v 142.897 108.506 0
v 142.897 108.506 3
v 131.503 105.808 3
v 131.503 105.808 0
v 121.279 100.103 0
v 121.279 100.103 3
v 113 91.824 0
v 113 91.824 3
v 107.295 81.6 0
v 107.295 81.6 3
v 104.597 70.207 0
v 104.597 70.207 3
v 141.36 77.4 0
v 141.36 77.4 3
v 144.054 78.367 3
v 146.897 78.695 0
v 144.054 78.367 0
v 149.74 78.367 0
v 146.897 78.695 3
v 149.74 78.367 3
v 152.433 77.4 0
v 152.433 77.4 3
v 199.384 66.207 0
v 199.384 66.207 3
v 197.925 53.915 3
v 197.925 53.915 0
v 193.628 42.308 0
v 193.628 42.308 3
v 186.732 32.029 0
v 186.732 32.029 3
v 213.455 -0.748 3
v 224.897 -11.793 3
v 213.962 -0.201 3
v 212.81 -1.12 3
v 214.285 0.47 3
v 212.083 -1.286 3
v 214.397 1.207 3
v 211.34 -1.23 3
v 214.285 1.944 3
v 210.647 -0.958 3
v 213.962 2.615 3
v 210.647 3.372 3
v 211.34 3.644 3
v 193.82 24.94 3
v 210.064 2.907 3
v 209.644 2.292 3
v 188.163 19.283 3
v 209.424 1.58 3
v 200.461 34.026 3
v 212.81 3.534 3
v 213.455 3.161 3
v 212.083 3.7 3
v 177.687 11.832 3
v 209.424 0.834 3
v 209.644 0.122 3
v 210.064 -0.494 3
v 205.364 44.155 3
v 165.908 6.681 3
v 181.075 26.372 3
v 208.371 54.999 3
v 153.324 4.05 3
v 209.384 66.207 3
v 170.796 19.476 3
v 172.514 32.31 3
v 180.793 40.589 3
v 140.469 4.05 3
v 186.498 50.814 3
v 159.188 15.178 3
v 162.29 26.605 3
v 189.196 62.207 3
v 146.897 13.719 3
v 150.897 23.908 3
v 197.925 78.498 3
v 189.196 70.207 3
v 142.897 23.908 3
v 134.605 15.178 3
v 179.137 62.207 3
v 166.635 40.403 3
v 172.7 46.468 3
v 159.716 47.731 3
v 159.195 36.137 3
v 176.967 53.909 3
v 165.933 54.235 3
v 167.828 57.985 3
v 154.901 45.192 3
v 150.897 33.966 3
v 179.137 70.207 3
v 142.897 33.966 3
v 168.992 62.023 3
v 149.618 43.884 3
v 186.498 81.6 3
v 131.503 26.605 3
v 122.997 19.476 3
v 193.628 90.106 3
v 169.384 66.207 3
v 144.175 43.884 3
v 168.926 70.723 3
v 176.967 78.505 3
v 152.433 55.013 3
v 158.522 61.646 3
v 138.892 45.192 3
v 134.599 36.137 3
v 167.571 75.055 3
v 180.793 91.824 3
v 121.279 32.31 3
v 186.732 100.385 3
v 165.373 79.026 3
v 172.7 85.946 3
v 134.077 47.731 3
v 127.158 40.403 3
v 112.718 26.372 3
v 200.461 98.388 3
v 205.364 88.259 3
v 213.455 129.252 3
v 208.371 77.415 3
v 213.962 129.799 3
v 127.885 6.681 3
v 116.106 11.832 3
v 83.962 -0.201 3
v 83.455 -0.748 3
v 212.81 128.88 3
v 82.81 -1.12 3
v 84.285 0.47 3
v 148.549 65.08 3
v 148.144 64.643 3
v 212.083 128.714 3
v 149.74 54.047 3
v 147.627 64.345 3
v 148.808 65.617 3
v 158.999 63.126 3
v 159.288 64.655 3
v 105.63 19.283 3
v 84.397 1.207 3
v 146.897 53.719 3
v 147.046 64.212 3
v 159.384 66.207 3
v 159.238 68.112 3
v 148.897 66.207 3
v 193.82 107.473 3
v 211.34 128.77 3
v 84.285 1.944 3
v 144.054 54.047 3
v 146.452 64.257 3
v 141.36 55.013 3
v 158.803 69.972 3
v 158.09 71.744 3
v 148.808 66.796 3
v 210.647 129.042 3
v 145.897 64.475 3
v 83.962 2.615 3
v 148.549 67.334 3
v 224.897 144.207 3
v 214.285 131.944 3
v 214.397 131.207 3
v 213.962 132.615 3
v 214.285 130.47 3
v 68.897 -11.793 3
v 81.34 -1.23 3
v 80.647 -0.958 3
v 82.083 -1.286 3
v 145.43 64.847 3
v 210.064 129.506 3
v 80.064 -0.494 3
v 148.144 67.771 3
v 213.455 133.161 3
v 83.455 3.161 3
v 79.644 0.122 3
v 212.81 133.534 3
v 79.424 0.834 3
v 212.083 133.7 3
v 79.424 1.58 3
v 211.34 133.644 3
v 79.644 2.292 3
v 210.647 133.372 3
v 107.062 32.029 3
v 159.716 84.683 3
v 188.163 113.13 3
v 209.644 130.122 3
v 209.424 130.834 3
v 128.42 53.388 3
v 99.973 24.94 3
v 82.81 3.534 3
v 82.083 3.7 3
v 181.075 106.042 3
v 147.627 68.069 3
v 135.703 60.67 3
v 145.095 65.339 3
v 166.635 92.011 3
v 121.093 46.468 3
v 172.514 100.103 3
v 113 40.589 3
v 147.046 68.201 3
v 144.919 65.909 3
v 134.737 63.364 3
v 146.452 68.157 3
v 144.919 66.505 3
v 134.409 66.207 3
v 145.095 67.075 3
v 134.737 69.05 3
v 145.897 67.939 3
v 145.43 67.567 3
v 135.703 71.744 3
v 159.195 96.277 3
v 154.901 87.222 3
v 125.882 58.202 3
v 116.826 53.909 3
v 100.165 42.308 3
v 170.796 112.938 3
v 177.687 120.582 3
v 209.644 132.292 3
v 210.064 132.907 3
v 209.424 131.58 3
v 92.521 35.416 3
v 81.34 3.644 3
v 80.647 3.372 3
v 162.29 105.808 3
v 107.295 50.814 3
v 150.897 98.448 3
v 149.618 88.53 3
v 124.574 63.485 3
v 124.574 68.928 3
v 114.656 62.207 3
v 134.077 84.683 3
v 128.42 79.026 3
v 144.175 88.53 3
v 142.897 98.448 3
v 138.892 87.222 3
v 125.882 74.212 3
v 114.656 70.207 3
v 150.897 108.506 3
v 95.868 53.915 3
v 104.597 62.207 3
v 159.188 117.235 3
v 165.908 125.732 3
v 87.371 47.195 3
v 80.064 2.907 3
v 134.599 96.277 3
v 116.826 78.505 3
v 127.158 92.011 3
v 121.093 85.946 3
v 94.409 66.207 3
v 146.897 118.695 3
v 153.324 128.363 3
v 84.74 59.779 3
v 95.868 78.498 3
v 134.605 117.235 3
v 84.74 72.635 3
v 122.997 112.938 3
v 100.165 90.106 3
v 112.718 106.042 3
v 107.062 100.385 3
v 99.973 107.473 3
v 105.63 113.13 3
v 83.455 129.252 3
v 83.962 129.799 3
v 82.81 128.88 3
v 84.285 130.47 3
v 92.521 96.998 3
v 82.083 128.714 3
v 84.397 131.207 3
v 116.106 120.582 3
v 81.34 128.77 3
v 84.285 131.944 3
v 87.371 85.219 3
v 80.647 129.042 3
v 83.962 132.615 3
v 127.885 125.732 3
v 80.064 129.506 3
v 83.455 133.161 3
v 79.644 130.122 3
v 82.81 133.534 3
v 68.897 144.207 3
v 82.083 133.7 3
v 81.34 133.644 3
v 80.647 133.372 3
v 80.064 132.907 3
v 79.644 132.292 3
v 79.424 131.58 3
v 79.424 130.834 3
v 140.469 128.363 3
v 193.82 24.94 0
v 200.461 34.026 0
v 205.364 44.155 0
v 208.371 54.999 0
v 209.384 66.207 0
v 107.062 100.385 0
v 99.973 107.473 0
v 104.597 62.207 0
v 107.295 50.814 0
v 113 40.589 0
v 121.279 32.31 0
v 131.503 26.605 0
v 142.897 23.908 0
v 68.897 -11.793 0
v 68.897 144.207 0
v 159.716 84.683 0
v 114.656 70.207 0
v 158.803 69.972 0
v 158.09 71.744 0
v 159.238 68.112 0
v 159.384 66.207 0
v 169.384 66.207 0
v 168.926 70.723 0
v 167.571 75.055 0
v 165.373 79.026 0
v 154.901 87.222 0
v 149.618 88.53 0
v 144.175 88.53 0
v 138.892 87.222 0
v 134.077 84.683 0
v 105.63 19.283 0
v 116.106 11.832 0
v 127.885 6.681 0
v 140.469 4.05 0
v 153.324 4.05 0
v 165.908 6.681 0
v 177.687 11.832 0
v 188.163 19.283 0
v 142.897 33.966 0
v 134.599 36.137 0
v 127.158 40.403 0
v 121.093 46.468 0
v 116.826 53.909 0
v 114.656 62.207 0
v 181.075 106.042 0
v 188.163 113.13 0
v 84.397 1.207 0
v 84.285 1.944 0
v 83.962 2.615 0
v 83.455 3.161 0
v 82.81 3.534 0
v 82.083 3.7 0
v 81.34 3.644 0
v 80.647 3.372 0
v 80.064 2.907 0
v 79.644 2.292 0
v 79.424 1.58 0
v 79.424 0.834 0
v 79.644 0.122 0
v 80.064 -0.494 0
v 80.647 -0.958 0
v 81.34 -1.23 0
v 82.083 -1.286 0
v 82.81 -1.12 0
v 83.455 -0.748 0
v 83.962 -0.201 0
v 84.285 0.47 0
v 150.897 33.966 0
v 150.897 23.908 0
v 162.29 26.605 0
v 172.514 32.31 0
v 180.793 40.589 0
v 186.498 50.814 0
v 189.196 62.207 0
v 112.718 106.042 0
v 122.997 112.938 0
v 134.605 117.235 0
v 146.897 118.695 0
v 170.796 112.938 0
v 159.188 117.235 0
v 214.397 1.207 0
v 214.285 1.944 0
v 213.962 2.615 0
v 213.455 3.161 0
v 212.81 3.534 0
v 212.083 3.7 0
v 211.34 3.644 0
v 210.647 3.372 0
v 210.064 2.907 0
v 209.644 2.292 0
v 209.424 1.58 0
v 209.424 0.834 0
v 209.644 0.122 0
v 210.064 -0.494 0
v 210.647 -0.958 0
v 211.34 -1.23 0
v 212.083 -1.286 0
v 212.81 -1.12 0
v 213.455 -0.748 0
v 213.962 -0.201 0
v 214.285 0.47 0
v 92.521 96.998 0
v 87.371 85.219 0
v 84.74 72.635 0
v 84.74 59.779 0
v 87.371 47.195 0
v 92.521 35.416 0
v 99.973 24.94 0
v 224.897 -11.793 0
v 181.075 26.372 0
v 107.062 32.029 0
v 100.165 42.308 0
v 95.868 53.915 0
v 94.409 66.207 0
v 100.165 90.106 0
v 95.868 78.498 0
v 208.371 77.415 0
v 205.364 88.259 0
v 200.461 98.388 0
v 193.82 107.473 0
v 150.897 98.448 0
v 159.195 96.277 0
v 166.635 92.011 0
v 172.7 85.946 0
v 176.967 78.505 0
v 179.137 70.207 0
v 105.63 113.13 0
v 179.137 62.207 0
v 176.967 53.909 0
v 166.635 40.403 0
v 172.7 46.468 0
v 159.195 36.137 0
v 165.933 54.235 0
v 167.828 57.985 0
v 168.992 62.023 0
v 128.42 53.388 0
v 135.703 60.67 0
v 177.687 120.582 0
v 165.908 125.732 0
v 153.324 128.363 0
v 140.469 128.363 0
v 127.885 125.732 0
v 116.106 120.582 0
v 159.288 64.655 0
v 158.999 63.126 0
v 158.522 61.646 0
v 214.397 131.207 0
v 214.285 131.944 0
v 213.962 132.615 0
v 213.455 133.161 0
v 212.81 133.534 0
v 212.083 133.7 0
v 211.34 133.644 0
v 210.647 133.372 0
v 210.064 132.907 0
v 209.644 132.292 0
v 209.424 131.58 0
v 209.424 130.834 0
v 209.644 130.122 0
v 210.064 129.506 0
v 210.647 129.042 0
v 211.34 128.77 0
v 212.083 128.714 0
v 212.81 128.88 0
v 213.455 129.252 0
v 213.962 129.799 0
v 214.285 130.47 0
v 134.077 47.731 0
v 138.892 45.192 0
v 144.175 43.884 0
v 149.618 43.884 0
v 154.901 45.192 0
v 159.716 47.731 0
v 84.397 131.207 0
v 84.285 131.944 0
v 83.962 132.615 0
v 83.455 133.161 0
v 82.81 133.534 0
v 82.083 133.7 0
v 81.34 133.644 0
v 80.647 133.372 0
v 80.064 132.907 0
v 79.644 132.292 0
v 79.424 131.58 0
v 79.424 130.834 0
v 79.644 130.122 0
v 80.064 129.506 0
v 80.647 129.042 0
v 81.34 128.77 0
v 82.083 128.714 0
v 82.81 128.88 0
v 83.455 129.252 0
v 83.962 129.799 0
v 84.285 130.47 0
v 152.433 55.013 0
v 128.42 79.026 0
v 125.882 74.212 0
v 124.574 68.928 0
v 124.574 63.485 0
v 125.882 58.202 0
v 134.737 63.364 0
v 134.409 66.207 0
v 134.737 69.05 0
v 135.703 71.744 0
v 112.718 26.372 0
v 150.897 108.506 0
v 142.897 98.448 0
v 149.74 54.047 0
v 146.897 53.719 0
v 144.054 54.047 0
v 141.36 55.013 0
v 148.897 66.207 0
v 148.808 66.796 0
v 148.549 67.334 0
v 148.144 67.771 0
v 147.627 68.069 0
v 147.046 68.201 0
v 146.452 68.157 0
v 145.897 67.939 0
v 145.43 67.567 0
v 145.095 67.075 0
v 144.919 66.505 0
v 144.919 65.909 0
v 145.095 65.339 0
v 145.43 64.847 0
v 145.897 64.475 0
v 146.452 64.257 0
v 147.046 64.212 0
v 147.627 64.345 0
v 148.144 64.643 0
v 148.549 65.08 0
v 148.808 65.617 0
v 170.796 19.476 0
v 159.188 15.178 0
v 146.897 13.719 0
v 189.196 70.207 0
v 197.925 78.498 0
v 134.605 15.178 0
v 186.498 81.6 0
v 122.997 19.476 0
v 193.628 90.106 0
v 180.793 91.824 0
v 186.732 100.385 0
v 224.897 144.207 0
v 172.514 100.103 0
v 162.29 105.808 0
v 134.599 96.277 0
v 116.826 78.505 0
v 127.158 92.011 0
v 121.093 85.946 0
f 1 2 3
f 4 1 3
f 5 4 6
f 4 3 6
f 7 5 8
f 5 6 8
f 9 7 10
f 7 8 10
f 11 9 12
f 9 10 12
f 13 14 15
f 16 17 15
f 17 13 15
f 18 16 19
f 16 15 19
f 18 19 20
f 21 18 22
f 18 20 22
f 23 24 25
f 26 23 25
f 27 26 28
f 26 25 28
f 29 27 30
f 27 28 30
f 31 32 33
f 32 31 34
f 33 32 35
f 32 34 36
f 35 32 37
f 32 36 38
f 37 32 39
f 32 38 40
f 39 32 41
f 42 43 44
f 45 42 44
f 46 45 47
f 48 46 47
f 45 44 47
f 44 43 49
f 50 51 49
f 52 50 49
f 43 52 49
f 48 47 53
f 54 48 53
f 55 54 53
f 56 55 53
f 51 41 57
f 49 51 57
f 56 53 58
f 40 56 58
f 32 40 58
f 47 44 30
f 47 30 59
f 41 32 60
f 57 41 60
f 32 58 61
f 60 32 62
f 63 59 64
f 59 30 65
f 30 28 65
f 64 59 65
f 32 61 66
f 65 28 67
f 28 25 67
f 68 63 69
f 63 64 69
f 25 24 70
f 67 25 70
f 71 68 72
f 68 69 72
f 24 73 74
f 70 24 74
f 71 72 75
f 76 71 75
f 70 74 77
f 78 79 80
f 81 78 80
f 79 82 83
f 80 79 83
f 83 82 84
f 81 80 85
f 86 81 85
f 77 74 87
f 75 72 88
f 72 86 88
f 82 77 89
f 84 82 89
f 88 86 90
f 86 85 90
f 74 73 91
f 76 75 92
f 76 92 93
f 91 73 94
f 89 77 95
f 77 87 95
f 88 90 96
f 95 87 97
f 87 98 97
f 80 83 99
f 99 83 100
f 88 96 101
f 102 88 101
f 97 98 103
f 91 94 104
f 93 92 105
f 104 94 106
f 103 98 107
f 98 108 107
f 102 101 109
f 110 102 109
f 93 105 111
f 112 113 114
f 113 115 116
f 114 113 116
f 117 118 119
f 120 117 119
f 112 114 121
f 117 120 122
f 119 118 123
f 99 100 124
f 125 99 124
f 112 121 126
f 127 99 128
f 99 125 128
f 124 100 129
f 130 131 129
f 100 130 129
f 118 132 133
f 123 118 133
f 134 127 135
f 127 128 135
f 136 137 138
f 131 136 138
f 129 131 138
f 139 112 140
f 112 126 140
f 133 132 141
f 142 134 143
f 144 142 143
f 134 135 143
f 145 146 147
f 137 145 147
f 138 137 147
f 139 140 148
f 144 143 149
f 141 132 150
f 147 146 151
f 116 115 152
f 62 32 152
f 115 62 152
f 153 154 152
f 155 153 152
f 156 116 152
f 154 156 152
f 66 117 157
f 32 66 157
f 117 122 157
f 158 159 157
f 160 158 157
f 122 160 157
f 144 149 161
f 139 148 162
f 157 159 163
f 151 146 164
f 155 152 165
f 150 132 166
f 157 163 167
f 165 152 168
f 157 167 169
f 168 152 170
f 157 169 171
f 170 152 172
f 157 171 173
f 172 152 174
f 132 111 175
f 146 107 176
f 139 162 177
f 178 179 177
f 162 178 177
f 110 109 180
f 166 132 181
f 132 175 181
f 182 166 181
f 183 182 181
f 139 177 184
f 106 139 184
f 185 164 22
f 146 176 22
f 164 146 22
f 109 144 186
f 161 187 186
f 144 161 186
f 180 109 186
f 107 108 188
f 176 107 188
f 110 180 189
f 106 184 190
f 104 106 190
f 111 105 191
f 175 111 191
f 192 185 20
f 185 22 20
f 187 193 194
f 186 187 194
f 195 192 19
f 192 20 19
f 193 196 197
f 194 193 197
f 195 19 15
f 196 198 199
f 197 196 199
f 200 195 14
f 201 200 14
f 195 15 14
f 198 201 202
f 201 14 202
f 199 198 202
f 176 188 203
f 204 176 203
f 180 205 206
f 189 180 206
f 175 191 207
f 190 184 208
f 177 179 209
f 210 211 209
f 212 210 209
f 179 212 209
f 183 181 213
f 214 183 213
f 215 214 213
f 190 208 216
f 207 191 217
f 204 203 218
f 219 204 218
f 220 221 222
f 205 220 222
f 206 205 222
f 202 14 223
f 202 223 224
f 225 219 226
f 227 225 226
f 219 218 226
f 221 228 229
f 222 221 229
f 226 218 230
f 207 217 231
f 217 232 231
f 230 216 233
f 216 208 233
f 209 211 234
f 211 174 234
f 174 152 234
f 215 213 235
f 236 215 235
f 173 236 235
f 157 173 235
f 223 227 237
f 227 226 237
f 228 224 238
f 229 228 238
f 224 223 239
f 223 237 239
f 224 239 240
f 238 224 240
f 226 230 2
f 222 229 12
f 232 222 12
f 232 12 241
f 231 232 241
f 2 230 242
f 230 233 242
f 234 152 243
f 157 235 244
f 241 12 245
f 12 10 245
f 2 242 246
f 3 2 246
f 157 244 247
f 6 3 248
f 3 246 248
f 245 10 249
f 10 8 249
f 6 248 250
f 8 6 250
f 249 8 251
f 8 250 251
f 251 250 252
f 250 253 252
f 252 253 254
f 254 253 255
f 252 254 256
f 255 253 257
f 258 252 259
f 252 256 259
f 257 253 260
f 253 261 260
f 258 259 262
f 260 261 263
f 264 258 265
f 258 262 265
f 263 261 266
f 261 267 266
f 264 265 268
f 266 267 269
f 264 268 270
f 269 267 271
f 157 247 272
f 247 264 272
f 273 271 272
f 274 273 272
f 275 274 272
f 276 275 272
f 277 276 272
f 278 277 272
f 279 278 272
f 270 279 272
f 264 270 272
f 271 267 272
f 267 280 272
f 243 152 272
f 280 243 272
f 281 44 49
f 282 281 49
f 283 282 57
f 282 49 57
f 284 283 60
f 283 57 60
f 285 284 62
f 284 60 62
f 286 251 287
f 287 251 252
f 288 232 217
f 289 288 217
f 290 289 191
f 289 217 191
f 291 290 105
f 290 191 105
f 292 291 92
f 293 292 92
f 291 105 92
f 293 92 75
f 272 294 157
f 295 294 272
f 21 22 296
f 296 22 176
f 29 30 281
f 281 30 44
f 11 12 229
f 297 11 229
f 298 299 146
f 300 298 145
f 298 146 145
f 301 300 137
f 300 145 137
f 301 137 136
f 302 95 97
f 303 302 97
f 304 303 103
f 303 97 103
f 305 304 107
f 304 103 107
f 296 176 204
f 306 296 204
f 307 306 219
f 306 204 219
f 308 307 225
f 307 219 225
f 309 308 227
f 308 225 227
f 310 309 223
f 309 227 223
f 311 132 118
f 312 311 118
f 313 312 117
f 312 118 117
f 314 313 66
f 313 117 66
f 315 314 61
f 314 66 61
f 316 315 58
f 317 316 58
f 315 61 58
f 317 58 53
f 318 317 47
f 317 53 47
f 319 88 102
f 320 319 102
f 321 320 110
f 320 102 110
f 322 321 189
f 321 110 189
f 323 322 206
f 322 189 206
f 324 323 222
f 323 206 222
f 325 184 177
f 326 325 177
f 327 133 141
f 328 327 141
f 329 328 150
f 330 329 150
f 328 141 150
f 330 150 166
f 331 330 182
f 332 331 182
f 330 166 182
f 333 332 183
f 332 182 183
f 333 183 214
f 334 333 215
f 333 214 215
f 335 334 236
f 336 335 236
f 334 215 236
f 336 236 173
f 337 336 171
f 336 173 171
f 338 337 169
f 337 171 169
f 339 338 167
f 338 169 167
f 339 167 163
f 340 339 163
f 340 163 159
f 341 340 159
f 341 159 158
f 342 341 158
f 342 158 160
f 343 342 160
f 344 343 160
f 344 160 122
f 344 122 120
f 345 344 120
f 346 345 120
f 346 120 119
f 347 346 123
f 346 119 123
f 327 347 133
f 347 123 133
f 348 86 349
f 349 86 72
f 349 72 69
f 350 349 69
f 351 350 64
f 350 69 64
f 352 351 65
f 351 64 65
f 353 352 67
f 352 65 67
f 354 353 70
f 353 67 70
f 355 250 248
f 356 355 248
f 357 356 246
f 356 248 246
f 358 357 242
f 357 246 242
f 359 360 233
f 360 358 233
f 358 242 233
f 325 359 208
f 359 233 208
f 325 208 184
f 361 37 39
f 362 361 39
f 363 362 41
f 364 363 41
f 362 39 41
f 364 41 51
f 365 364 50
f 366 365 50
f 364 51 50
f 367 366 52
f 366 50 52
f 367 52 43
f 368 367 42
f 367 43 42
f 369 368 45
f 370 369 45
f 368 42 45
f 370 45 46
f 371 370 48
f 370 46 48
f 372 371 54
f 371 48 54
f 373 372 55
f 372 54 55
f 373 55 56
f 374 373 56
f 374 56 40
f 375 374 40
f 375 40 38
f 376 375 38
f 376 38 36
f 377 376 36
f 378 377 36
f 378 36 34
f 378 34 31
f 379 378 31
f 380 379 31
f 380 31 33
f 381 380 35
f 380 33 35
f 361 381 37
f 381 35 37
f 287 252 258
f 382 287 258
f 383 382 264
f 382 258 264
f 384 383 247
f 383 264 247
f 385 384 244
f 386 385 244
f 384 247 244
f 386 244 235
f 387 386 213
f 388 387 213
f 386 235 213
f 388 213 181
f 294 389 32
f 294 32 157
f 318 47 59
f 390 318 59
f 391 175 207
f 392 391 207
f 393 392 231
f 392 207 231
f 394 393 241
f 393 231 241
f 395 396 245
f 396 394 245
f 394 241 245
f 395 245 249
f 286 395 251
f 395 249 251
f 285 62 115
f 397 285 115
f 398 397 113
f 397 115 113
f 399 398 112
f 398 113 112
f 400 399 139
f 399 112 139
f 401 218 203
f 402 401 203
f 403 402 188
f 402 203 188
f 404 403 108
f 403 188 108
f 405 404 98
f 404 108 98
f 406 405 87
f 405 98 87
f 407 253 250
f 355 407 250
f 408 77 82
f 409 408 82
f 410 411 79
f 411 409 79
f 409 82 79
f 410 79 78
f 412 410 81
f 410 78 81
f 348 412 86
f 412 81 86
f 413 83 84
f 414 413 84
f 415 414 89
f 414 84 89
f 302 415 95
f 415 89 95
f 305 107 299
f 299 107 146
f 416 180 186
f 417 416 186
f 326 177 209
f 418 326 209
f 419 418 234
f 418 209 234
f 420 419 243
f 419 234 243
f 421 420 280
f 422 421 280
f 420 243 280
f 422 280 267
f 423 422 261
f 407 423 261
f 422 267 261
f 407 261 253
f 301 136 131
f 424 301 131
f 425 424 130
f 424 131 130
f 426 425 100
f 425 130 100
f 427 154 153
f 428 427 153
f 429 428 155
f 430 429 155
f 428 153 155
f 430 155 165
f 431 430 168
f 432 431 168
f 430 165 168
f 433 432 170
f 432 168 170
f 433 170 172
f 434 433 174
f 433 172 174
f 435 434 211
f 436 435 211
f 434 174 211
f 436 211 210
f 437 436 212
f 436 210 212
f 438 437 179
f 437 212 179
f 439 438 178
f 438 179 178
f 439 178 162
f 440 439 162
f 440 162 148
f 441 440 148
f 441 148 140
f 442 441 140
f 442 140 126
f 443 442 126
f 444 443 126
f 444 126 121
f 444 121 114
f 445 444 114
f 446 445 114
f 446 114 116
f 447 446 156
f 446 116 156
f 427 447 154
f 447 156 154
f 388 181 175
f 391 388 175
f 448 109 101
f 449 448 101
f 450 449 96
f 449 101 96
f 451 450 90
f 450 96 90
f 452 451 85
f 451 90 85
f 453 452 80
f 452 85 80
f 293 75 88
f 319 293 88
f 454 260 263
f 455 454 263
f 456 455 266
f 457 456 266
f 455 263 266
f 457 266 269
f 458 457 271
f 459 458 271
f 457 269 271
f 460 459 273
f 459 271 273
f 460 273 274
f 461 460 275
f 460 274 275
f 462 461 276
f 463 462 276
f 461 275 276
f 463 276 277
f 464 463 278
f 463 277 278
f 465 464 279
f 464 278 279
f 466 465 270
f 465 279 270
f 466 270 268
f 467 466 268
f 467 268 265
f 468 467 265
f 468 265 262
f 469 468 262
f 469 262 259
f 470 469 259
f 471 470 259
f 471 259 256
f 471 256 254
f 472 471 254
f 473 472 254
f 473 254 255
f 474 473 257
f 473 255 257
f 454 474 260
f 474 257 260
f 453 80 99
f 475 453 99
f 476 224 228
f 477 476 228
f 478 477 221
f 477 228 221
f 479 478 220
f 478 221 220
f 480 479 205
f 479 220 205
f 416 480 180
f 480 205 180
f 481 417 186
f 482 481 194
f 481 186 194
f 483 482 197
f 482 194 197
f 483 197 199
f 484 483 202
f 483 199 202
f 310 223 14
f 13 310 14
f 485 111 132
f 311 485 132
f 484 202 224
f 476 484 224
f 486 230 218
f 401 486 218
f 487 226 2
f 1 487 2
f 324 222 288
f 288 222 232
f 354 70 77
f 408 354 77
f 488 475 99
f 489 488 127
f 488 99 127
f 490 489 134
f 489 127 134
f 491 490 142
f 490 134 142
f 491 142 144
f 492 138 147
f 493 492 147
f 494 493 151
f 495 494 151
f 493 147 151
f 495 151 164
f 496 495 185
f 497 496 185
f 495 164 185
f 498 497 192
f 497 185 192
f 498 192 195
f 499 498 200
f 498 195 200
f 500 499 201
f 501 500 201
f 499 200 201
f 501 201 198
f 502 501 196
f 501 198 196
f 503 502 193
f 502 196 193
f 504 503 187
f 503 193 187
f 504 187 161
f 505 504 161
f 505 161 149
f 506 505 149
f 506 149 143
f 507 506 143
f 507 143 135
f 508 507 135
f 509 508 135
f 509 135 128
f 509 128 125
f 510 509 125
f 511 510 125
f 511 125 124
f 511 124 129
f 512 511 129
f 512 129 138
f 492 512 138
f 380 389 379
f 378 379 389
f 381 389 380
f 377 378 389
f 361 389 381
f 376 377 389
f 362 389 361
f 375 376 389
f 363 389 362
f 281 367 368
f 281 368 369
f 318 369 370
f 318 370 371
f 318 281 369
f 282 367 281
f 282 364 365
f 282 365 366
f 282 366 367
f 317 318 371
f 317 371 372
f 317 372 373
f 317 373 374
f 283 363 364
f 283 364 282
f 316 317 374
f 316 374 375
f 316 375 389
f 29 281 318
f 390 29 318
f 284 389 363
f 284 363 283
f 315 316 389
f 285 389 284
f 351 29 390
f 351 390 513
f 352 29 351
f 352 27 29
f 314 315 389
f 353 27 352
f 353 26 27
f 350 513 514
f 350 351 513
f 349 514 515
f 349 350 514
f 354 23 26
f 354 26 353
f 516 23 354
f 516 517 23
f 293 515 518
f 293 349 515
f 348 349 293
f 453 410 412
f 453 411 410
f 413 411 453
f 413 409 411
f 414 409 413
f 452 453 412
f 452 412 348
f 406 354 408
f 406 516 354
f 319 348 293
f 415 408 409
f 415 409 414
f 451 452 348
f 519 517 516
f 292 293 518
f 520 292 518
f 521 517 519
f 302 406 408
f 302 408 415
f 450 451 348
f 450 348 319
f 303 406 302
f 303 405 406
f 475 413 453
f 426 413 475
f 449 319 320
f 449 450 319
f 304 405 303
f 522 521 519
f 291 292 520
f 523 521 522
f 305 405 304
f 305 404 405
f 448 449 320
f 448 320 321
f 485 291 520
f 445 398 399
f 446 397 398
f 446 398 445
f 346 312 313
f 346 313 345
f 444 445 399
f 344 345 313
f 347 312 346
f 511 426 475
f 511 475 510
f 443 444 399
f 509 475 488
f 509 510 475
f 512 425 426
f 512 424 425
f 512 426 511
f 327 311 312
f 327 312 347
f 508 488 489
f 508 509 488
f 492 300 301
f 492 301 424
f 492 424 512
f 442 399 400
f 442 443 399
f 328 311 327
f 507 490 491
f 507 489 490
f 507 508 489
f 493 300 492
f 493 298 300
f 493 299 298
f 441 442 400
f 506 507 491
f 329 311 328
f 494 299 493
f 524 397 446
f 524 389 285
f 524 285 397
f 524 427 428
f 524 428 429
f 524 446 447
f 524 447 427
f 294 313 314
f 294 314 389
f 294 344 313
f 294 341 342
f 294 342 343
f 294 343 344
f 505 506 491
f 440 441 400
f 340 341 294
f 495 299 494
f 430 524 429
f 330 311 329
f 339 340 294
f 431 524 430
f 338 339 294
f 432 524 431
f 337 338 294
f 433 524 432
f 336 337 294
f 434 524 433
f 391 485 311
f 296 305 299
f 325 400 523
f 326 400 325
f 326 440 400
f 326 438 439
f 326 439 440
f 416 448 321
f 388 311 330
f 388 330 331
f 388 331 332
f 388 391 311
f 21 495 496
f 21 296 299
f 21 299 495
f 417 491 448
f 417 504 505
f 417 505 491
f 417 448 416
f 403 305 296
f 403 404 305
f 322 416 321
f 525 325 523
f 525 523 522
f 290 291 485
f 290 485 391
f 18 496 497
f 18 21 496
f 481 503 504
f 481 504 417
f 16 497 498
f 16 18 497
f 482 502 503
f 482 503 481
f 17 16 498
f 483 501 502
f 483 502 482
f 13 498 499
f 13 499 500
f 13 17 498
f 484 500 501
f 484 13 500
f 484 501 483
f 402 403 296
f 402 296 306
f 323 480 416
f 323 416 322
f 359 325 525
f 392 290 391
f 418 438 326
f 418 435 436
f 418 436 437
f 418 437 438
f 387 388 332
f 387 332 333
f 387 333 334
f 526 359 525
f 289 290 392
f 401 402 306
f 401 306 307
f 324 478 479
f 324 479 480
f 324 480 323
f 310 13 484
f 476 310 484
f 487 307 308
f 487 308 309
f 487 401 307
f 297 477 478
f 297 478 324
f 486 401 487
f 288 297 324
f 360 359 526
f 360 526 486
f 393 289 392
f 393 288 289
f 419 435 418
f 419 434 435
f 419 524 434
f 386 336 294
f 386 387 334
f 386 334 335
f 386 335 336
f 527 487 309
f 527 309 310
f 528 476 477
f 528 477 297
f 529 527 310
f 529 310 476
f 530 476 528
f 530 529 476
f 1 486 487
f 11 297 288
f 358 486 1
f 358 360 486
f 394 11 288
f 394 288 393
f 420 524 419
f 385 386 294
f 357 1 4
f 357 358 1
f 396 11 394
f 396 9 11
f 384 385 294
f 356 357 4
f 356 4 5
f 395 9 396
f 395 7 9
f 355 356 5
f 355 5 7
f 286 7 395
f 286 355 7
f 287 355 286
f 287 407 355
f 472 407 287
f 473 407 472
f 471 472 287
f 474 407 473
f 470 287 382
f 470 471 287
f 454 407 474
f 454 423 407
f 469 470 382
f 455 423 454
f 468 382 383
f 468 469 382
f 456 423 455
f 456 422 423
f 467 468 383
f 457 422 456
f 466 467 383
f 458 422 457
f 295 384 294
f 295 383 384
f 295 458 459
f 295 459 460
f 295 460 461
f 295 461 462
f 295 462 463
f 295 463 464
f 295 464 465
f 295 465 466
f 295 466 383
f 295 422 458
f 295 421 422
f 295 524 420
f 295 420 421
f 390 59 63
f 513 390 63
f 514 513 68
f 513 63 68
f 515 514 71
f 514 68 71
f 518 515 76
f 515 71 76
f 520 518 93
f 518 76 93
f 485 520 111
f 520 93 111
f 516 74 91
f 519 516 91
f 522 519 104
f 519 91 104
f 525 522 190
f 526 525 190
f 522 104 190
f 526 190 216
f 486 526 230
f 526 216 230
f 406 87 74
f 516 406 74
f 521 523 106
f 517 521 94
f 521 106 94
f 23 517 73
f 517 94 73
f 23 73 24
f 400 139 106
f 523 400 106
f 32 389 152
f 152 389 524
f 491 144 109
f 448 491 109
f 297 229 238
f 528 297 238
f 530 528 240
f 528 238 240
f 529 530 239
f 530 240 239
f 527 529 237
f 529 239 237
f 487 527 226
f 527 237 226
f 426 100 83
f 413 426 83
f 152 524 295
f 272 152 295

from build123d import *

# Parameters (mm, degrees)
SKETCH1_W           = 150
SKETCH1_H           = 150
BOSS_EXTRUDE1_DEPTH = 3
CUT_EXTRUDE1_DEPTH  = 264.0332057
SKETCH4_R           = 2.5
CUT_EXTRUDE2_DEPTH  = 3
SKETCH5_W           = 156
SKETCH5_H           = 156
SKETCH5_W_2         = 150
SKETCH5_H_2         = 150
BOSS_EXTRUDE2_DEPTH = 3
SKETCH6_R           = 2
CUT_EXTRUDE3_DEPTH  = 10


with BuildPart() as part:
    # Sketch1 → Boss-Extrude1 (new body)
    with BuildSketch(Plane.XY):
        with Locations((146.896551724, 66.206896552)):
            Rectangle(SKETCH1_W, SKETCH1_H)
    extrude(amount=BOSS_EXTRUDE1_DEPTH)

    # Sketch2 → Cut-Extrude1 (cut, through all)
    with BuildSketch(Plane.XY.offset(3)):
        with BuildLine():
            ThreePointArc((188.163122783, 113.13032186), (146.896551724, 128.694797217), (105.629980666, 113.13032186))
            Line((105.629980666, 113.13032186), (112.718359737, 106.041942789))
            ThreePointArc((112.718359737, 106.041942789), (146.896551724, 118.694797217), (181.074743712, 106.041942789))
            Line((181.074743712, 106.041942789), (188.163122783, 113.13032186))
        make_face()
        with BuildLine():
            Line((107.061505487, 100.385088539), (99.973126416, 107.47346761))
            ThreePointArc((99.973126416, 107.47346761), (84.408651059, 66.206896552), (99.973126416, 24.940325493))
            Line((99.973126416, 24.940325493), (107.061505487, 32.028704564))
            ThreePointArc((107.061505487, 32.028704564), (94.408651059, 66.206896552), (107.061505487, 100.385088539))
        make_face()
        with BuildLine():
            ThreePointArc((209.384452389, 66.206896552), (205.363995952, 88.259009716), (193.819977032, 107.47346761))
            Line((193.819977032, 107.47346761), (186.731597961, 100.385088539))
            ThreePointArc((186.731597961, 100.385088539), (196.119705149, 84.429434333), (199.384452389, 66.206896552))
            ThreePointArc((199.384452389, 66.206896552), (196.119705149, 47.984358771), (186.731597961, 32.028704564))
            Line((186.731597961, 32.028704564), (193.819977032, 24.940325493))
            ThreePointArc((193.819977032, 24.940325493), (205.363995952, 44.154783387), (209.384452389, 66.206896552))
        make_face()
        with BuildLine():
            Line((112.718359737, 26.371850315), (105.629980666, 19.283471244))
            ThreePointArc((105.629980666, 19.283471244), (146.896551724, 3.718995886), (188.163122783, 19.283471244))
            Line((188.163122783, 19.283471244), (181.074743712, 26.371850315))
            ThreePointArc((181.074743712, 26.371850315), (146.896551724, 13.718995886), (112.718359737, 26.371850315))
        make_face()
        with BuildLine():
            ThreePointArc((150.896551724, 23.907703853), (176.940034403, 36.163413873), (189.195744423, 62.206896552))
            Line((189.195744423, 62.206896552), (179.137266506, 62.206896552))
            ThreePointArc((179.137266506, 62.206896552), (169.868966591, 43.234481685), (150.896551724, 33.96618177))
            Line((150.896551724, 33.96618177), (150.896551724, 23.907703853))
        make_face()
        with BuildLine():
            Line((114.655836942, 62.206896552), (104.597359026, 62.206896552))
            ThreePointArc((104.597359026, 62.206896552), (116.853069045, 36.163413873), (142.896551724, 23.907703853))
            Line((142.896551724, 23.907703853), (142.896551724, 33.96618177))
            ThreePointArc((142.896551724, 33.96618177), (123.924136857, 43.234481685), (114.655836942, 62.206896552))
        make_face()
        with BuildLine():
            Line((142.896551724, 98.447611333), (142.896551724, 108.50608925))
            ThreePointArc((142.896551724, 108.50608925), (116.853069045, 96.250379231), (104.597359026, 70.206896552))
            Line((104.597359026, 70.206896552), (114.655836942, 70.206896552))
            ThreePointArc((114.655836942, 70.206896552), (123.924136857, 89.179311419), (142.896551724, 98.447611333))
        make_face()
        with BuildLine():
            ThreePointArc((189.195744423, 70.206896552), (176.940034403, 96.250379231), (150.896551724, 108.50608925))
            Line((150.896551724, 108.50608925), (150.896551724, 98.447611333))
            ThreePointArc((150.896551724, 98.447611333), (169.868966591, 89.179311419), (179.137266506, 70.206896552))
            Line((179.137266506, 70.206896552), (189.195744423, 70.206896552))
        make_face()
        with BuildLine():
            Line((165.372753073, 79.026243651), (158.090015102, 71.74350568))
            ThreePointArc((158.090015102, 71.74350568), (159.056537781, 69.049853135), (159.384452389, 66.206896552))
            ThreePointArc((159.384452389, 66.206896552), (159.166880972, 63.885973637), (158.521748029, 61.645923641))
            Line((158.521748029, 61.645923641), (165.932760465, 54.234911206))
            ThreePointArc((165.932760465, 54.234911206), (168.504305512, 59.977076926), (169.384452389, 66.206896552))
            ThreePointArc((169.384452389, 66.206896552), (168.358106385, 72.923096956), (165.372753073, 79.026243651))
        make_face()
        with BuildLine():
            Line((134.077204625, 84.6830979), (141.359942596, 77.400359929))
            ThreePointArc((141.359942596, 77.400359929), (146.896551724, 78.694797217), (152.433160852, 77.400359929))
            Line((152.433160852, 77.400359929), (159.715898823, 84.6830979))
            ThreePointArc((159.715898823, 84.6830979), (146.896551724, 88.694797217), (134.077204625, 84.6830979))
        make_face()
        with BuildLine():
            ThreePointArc((135.703088346, 60.670287424), (134.408651059, 66.206896552), (135.703088346, 71.74350568))
            Line((135.703088346, 71.74350568), (128.420350375, 79.026243651))
            ThreePointArc((128.420350375, 79.026243651), (124.408651059, 66.206896552), (128.420350375, 53.387549452))
            Line((128.420350375, 53.387549452), (135.703088346, 60.670287424))
        make_face()
        with BuildLine():
            ThreePointArc((152.433160852, 55.013433174), (146.896551724, 53.718995886), (141.359942596, 55.013433174))
            Line((141.359942596, 55.013433174), (134.077204625, 47.730695203))
            ThreePointArc((134.077204625, 47.730695203), (146.896551724, 43.718995886), (159.715898823, 47.730695203))
            Line((159.715898823, 47.730695203), (152.433160852, 55.013433174))
        make_face()
    extrude(amount=-CUT_EXTRUDE1_DEPTH, mode=Mode.SUBTRACT)

    # Sketch4 → Cut-Extrude2 (cut)
    with BuildSketch(Plane.XY.offset(3)):
        with Locations((81.896551724, 131.206896552)):
            Circle(SKETCH4_R)
        with Locations((211.896551724, 131.206896552)):
            Circle(SKETCH4_R)
        with Locations((211.896551724, 1.206896552)):
            Circle(SKETCH4_R)
        with Locations((81.896551724, 1.206896552)):
            Circle(SKETCH4_R)
    extrude(amount=-CUT_EXTRUDE2_DEPTH, mode=Mode.SUBTRACT)

    # Sketch5 → Boss-Extrude2 (add)
    with BuildSketch(Plane(origin=(0, 0, 0), x_dir=(-1, 0, 0), z_dir=(0, 0, -1))):
        with Locations((-146.896551724, 66.206896552)):
            Rectangle(SKETCH5_W, SKETCH5_H)
        with Locations((-146.896551724, 66.206896552)):
            Rectangle(SKETCH5_W_2, SKETCH5_H_2, mode=Mode.SUBTRACT)
    extrude(amount=-BOSS_EXTRUDE2_DEPTH)

    # Sketch6 → Cut-Extrude3 (cut)
    with BuildSketch(Plane.XY.offset(3)):
        with Locations((146.896551724, 66.206896552)):
            Circle(SKETCH6_R)
    extrude(amount=-CUT_EXTRUDE3_DEPTH, mode=Mode.SUBTRACT)


solid = part.part
